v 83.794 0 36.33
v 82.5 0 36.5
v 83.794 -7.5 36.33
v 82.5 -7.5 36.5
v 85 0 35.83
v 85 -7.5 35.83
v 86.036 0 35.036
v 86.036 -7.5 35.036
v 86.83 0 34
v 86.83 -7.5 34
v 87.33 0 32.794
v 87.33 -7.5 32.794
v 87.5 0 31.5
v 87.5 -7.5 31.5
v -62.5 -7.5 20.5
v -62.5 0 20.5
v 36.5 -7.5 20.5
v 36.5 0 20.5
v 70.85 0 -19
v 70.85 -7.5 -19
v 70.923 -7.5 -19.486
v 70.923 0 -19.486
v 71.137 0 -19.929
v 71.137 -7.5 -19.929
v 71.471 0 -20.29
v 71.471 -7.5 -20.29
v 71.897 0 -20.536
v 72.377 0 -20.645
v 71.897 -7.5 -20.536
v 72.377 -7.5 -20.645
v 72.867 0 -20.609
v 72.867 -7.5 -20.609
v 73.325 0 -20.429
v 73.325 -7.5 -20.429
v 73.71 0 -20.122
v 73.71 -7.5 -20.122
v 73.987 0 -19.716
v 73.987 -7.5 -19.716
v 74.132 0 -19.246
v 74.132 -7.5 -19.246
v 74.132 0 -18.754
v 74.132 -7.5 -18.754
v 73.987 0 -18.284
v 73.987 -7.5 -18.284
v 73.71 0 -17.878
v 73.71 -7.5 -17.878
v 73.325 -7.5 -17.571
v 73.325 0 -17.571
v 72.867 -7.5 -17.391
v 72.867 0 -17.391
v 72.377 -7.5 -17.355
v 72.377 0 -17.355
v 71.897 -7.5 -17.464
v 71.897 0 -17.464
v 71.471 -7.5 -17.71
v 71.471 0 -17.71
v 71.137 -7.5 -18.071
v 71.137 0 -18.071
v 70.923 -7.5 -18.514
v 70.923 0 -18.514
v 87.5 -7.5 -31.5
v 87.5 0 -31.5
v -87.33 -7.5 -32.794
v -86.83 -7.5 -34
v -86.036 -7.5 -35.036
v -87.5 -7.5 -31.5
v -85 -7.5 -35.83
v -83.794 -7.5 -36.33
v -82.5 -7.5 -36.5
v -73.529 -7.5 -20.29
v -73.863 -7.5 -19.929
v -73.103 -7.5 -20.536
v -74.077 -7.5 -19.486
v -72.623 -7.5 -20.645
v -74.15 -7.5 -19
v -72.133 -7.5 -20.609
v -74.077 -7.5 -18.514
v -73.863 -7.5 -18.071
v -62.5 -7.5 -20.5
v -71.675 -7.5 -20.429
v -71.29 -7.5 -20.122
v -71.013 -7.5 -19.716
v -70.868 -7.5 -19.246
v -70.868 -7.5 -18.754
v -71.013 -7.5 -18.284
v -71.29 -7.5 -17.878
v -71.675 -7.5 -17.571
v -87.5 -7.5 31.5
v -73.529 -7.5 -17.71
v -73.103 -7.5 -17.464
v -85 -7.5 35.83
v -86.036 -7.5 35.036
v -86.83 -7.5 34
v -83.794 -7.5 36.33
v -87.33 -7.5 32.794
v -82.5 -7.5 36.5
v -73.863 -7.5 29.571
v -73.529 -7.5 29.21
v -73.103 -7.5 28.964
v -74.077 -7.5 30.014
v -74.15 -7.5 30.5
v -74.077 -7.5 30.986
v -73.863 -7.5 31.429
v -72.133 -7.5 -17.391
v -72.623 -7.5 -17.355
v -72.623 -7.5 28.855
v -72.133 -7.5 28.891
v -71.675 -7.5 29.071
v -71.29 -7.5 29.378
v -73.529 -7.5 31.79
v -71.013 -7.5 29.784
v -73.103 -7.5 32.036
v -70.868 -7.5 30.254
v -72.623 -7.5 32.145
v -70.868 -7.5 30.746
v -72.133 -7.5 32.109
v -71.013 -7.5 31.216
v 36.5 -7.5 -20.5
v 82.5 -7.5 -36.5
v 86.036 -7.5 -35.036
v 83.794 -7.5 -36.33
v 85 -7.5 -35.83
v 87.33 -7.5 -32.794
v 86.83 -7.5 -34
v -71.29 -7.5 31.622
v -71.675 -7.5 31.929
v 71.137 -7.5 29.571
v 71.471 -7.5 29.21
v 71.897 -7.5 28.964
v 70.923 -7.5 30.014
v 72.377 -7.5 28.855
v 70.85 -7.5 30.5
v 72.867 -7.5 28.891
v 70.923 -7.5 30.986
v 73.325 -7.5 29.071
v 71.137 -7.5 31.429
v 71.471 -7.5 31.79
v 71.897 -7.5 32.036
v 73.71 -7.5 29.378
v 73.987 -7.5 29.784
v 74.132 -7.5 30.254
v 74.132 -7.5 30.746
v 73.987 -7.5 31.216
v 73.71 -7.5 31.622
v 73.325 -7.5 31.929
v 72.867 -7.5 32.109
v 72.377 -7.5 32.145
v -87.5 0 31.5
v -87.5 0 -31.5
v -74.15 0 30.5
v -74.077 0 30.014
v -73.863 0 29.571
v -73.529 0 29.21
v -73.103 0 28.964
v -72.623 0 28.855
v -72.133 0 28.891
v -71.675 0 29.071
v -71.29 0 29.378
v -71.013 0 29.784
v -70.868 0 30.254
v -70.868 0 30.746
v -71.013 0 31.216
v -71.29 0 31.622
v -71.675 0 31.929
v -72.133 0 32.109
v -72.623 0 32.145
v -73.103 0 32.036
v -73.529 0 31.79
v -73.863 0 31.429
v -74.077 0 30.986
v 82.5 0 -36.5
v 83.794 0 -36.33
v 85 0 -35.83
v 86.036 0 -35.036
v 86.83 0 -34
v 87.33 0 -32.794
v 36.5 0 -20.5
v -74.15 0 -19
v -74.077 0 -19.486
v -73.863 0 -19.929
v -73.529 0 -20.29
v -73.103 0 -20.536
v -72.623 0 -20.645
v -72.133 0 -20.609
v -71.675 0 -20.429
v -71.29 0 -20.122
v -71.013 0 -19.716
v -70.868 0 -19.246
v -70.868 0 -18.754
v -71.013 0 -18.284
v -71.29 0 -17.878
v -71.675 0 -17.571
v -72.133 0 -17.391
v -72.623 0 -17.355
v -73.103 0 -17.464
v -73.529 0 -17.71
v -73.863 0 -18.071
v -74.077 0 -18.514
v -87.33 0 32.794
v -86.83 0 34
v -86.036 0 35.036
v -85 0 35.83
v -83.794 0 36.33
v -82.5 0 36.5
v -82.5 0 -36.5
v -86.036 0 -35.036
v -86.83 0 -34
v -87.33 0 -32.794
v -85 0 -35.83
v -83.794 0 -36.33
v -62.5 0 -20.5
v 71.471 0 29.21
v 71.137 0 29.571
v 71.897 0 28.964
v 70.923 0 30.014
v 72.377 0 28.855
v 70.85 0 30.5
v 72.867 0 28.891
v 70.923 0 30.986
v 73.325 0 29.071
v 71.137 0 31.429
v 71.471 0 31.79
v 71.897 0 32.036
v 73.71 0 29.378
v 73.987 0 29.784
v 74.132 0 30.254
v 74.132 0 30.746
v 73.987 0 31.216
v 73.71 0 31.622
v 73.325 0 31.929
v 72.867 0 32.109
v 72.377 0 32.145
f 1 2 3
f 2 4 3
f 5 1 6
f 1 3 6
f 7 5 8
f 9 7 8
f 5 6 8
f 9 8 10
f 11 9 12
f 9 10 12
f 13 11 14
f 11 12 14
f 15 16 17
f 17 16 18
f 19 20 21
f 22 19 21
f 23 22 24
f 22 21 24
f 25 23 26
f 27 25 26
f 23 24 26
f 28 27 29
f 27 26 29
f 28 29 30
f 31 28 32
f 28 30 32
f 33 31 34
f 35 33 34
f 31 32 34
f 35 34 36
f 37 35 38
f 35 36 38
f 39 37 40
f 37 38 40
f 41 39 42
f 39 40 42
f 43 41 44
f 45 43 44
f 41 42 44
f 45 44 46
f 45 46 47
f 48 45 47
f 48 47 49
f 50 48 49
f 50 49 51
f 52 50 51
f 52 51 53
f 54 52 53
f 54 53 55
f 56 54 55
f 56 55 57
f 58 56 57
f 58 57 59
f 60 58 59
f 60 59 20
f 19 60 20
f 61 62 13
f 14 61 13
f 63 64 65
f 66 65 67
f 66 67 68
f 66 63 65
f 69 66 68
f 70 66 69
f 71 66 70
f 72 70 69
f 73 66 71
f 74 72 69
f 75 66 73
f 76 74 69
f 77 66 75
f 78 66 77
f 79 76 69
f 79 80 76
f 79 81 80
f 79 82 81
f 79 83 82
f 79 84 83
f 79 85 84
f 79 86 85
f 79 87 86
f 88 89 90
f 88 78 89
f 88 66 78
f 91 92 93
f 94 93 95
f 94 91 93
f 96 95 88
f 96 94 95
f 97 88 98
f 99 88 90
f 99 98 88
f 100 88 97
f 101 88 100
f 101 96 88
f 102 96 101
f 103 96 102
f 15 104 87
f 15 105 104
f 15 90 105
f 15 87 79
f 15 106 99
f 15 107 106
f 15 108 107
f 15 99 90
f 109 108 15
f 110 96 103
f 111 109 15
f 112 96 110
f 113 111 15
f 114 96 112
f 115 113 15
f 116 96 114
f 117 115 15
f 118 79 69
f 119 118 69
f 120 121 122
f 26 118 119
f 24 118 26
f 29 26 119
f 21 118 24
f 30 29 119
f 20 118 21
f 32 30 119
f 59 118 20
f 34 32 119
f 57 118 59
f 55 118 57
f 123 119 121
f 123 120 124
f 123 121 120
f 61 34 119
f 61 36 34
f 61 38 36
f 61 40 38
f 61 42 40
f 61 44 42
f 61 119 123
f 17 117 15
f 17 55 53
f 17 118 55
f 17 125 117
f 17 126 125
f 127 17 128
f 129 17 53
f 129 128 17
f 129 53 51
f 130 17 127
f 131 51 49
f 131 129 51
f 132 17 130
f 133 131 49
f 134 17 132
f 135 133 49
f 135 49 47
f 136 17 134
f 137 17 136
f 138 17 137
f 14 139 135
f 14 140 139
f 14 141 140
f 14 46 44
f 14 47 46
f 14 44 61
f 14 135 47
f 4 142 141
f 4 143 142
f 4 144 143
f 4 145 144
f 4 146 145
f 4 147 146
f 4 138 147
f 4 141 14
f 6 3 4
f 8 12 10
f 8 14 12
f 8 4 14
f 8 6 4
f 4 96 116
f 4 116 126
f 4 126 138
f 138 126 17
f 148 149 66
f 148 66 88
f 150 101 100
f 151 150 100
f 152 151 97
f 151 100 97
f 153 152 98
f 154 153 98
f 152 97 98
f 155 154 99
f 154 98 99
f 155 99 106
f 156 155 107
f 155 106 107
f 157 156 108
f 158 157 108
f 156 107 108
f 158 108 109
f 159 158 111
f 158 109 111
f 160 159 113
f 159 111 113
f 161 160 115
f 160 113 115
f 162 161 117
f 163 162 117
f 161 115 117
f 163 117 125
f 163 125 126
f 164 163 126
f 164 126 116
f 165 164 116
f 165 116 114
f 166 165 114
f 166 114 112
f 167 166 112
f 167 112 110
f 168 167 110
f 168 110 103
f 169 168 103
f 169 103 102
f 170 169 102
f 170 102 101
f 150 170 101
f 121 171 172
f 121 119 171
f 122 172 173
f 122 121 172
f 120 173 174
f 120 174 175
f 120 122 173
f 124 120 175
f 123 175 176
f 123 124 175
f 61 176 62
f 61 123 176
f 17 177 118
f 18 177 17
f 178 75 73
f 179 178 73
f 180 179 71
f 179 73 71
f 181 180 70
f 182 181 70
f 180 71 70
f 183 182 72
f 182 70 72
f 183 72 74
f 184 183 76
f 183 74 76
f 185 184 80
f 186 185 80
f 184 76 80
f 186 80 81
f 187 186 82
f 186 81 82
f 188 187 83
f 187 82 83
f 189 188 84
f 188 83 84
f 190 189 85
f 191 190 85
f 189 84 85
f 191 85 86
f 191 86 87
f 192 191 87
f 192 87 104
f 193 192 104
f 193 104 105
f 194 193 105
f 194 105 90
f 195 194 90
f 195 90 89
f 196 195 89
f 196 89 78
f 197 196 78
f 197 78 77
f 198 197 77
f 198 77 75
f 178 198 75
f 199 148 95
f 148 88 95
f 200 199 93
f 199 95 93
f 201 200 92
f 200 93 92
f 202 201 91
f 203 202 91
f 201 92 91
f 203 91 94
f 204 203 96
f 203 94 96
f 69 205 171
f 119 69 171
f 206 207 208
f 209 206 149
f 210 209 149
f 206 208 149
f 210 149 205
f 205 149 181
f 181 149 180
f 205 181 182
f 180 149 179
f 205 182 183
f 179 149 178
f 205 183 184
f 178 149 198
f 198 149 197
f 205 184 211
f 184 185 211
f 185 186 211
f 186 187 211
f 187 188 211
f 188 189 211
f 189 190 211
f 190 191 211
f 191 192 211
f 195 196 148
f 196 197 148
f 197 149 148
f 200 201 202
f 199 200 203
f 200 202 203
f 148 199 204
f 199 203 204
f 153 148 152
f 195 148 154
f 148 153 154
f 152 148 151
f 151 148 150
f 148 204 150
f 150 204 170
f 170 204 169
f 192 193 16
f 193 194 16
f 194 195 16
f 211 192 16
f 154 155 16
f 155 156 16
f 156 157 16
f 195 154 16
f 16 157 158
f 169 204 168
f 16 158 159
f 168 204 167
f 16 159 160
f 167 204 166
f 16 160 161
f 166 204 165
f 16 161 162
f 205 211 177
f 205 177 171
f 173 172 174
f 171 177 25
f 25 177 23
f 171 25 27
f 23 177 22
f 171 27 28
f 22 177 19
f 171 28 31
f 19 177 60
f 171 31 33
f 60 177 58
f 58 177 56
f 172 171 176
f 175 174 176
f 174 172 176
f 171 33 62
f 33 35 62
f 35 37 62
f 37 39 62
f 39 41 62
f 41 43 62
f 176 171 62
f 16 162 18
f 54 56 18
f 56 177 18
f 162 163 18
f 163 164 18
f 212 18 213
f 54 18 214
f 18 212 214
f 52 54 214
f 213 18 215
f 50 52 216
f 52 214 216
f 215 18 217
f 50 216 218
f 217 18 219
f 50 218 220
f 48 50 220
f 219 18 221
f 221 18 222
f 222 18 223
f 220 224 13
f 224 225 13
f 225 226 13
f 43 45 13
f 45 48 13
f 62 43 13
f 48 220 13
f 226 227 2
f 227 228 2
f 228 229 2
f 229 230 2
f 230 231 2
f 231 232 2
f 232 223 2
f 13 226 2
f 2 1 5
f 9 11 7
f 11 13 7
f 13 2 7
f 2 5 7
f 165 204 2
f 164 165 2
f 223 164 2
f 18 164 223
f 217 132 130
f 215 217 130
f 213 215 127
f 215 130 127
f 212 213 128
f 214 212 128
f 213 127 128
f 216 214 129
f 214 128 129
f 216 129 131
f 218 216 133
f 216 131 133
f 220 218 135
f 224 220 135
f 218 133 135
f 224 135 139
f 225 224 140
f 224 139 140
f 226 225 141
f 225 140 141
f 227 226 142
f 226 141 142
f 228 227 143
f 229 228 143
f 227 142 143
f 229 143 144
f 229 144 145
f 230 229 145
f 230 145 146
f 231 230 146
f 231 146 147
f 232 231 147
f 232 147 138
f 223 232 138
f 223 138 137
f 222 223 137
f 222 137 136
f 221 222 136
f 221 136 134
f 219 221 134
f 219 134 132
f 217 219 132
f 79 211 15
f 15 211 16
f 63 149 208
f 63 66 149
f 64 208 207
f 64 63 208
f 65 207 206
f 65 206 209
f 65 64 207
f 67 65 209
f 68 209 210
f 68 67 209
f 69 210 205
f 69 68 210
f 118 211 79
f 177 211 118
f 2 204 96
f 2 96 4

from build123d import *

# Parameters (mm, degrees)
F0_W     = 175
F0_H     = 73
F0_W_2   = 99
F0_H_2   = 41
F1_DEPTH = 7.5
F2_R     = 5
F3_D     = 3.3


with BuildPart() as f1:
    # F0 (on Front) → F1 (new body)
    with BuildSketch(Plane.XZ):
        Rectangle(F0_W, F0_H)
        with Locations((-13, 0)):
            Rectangle(F0_W_2, F0_H_2, mode=Mode.SUBTRACT)
    extrude(amount=F1_DEPTH)

    # F2
    f2_edges = [f1.edges().sort_by_distance(p)[0] for p in [
        (-87.5, -3.75, 36.5),
        (87.5, -3.75, 36.5),
        (87.5, -3.75, -36.5),
        (-87.5, -3.75, -36.5),
    ]]
    fillet(f2_edges, radius=F2_R)

    # F3 (through all)
    with Locations(Plane(origin=(0, 0, 0), x_dir=(1, 0, 0), z_dir=(0, 1, 0))):
        with Locations((-72.5, -30.5), (-72.5, 19), (72.5, 19), (72.5, -30.5)):
            Hole(F3_D / 2)


solid = f1.part
